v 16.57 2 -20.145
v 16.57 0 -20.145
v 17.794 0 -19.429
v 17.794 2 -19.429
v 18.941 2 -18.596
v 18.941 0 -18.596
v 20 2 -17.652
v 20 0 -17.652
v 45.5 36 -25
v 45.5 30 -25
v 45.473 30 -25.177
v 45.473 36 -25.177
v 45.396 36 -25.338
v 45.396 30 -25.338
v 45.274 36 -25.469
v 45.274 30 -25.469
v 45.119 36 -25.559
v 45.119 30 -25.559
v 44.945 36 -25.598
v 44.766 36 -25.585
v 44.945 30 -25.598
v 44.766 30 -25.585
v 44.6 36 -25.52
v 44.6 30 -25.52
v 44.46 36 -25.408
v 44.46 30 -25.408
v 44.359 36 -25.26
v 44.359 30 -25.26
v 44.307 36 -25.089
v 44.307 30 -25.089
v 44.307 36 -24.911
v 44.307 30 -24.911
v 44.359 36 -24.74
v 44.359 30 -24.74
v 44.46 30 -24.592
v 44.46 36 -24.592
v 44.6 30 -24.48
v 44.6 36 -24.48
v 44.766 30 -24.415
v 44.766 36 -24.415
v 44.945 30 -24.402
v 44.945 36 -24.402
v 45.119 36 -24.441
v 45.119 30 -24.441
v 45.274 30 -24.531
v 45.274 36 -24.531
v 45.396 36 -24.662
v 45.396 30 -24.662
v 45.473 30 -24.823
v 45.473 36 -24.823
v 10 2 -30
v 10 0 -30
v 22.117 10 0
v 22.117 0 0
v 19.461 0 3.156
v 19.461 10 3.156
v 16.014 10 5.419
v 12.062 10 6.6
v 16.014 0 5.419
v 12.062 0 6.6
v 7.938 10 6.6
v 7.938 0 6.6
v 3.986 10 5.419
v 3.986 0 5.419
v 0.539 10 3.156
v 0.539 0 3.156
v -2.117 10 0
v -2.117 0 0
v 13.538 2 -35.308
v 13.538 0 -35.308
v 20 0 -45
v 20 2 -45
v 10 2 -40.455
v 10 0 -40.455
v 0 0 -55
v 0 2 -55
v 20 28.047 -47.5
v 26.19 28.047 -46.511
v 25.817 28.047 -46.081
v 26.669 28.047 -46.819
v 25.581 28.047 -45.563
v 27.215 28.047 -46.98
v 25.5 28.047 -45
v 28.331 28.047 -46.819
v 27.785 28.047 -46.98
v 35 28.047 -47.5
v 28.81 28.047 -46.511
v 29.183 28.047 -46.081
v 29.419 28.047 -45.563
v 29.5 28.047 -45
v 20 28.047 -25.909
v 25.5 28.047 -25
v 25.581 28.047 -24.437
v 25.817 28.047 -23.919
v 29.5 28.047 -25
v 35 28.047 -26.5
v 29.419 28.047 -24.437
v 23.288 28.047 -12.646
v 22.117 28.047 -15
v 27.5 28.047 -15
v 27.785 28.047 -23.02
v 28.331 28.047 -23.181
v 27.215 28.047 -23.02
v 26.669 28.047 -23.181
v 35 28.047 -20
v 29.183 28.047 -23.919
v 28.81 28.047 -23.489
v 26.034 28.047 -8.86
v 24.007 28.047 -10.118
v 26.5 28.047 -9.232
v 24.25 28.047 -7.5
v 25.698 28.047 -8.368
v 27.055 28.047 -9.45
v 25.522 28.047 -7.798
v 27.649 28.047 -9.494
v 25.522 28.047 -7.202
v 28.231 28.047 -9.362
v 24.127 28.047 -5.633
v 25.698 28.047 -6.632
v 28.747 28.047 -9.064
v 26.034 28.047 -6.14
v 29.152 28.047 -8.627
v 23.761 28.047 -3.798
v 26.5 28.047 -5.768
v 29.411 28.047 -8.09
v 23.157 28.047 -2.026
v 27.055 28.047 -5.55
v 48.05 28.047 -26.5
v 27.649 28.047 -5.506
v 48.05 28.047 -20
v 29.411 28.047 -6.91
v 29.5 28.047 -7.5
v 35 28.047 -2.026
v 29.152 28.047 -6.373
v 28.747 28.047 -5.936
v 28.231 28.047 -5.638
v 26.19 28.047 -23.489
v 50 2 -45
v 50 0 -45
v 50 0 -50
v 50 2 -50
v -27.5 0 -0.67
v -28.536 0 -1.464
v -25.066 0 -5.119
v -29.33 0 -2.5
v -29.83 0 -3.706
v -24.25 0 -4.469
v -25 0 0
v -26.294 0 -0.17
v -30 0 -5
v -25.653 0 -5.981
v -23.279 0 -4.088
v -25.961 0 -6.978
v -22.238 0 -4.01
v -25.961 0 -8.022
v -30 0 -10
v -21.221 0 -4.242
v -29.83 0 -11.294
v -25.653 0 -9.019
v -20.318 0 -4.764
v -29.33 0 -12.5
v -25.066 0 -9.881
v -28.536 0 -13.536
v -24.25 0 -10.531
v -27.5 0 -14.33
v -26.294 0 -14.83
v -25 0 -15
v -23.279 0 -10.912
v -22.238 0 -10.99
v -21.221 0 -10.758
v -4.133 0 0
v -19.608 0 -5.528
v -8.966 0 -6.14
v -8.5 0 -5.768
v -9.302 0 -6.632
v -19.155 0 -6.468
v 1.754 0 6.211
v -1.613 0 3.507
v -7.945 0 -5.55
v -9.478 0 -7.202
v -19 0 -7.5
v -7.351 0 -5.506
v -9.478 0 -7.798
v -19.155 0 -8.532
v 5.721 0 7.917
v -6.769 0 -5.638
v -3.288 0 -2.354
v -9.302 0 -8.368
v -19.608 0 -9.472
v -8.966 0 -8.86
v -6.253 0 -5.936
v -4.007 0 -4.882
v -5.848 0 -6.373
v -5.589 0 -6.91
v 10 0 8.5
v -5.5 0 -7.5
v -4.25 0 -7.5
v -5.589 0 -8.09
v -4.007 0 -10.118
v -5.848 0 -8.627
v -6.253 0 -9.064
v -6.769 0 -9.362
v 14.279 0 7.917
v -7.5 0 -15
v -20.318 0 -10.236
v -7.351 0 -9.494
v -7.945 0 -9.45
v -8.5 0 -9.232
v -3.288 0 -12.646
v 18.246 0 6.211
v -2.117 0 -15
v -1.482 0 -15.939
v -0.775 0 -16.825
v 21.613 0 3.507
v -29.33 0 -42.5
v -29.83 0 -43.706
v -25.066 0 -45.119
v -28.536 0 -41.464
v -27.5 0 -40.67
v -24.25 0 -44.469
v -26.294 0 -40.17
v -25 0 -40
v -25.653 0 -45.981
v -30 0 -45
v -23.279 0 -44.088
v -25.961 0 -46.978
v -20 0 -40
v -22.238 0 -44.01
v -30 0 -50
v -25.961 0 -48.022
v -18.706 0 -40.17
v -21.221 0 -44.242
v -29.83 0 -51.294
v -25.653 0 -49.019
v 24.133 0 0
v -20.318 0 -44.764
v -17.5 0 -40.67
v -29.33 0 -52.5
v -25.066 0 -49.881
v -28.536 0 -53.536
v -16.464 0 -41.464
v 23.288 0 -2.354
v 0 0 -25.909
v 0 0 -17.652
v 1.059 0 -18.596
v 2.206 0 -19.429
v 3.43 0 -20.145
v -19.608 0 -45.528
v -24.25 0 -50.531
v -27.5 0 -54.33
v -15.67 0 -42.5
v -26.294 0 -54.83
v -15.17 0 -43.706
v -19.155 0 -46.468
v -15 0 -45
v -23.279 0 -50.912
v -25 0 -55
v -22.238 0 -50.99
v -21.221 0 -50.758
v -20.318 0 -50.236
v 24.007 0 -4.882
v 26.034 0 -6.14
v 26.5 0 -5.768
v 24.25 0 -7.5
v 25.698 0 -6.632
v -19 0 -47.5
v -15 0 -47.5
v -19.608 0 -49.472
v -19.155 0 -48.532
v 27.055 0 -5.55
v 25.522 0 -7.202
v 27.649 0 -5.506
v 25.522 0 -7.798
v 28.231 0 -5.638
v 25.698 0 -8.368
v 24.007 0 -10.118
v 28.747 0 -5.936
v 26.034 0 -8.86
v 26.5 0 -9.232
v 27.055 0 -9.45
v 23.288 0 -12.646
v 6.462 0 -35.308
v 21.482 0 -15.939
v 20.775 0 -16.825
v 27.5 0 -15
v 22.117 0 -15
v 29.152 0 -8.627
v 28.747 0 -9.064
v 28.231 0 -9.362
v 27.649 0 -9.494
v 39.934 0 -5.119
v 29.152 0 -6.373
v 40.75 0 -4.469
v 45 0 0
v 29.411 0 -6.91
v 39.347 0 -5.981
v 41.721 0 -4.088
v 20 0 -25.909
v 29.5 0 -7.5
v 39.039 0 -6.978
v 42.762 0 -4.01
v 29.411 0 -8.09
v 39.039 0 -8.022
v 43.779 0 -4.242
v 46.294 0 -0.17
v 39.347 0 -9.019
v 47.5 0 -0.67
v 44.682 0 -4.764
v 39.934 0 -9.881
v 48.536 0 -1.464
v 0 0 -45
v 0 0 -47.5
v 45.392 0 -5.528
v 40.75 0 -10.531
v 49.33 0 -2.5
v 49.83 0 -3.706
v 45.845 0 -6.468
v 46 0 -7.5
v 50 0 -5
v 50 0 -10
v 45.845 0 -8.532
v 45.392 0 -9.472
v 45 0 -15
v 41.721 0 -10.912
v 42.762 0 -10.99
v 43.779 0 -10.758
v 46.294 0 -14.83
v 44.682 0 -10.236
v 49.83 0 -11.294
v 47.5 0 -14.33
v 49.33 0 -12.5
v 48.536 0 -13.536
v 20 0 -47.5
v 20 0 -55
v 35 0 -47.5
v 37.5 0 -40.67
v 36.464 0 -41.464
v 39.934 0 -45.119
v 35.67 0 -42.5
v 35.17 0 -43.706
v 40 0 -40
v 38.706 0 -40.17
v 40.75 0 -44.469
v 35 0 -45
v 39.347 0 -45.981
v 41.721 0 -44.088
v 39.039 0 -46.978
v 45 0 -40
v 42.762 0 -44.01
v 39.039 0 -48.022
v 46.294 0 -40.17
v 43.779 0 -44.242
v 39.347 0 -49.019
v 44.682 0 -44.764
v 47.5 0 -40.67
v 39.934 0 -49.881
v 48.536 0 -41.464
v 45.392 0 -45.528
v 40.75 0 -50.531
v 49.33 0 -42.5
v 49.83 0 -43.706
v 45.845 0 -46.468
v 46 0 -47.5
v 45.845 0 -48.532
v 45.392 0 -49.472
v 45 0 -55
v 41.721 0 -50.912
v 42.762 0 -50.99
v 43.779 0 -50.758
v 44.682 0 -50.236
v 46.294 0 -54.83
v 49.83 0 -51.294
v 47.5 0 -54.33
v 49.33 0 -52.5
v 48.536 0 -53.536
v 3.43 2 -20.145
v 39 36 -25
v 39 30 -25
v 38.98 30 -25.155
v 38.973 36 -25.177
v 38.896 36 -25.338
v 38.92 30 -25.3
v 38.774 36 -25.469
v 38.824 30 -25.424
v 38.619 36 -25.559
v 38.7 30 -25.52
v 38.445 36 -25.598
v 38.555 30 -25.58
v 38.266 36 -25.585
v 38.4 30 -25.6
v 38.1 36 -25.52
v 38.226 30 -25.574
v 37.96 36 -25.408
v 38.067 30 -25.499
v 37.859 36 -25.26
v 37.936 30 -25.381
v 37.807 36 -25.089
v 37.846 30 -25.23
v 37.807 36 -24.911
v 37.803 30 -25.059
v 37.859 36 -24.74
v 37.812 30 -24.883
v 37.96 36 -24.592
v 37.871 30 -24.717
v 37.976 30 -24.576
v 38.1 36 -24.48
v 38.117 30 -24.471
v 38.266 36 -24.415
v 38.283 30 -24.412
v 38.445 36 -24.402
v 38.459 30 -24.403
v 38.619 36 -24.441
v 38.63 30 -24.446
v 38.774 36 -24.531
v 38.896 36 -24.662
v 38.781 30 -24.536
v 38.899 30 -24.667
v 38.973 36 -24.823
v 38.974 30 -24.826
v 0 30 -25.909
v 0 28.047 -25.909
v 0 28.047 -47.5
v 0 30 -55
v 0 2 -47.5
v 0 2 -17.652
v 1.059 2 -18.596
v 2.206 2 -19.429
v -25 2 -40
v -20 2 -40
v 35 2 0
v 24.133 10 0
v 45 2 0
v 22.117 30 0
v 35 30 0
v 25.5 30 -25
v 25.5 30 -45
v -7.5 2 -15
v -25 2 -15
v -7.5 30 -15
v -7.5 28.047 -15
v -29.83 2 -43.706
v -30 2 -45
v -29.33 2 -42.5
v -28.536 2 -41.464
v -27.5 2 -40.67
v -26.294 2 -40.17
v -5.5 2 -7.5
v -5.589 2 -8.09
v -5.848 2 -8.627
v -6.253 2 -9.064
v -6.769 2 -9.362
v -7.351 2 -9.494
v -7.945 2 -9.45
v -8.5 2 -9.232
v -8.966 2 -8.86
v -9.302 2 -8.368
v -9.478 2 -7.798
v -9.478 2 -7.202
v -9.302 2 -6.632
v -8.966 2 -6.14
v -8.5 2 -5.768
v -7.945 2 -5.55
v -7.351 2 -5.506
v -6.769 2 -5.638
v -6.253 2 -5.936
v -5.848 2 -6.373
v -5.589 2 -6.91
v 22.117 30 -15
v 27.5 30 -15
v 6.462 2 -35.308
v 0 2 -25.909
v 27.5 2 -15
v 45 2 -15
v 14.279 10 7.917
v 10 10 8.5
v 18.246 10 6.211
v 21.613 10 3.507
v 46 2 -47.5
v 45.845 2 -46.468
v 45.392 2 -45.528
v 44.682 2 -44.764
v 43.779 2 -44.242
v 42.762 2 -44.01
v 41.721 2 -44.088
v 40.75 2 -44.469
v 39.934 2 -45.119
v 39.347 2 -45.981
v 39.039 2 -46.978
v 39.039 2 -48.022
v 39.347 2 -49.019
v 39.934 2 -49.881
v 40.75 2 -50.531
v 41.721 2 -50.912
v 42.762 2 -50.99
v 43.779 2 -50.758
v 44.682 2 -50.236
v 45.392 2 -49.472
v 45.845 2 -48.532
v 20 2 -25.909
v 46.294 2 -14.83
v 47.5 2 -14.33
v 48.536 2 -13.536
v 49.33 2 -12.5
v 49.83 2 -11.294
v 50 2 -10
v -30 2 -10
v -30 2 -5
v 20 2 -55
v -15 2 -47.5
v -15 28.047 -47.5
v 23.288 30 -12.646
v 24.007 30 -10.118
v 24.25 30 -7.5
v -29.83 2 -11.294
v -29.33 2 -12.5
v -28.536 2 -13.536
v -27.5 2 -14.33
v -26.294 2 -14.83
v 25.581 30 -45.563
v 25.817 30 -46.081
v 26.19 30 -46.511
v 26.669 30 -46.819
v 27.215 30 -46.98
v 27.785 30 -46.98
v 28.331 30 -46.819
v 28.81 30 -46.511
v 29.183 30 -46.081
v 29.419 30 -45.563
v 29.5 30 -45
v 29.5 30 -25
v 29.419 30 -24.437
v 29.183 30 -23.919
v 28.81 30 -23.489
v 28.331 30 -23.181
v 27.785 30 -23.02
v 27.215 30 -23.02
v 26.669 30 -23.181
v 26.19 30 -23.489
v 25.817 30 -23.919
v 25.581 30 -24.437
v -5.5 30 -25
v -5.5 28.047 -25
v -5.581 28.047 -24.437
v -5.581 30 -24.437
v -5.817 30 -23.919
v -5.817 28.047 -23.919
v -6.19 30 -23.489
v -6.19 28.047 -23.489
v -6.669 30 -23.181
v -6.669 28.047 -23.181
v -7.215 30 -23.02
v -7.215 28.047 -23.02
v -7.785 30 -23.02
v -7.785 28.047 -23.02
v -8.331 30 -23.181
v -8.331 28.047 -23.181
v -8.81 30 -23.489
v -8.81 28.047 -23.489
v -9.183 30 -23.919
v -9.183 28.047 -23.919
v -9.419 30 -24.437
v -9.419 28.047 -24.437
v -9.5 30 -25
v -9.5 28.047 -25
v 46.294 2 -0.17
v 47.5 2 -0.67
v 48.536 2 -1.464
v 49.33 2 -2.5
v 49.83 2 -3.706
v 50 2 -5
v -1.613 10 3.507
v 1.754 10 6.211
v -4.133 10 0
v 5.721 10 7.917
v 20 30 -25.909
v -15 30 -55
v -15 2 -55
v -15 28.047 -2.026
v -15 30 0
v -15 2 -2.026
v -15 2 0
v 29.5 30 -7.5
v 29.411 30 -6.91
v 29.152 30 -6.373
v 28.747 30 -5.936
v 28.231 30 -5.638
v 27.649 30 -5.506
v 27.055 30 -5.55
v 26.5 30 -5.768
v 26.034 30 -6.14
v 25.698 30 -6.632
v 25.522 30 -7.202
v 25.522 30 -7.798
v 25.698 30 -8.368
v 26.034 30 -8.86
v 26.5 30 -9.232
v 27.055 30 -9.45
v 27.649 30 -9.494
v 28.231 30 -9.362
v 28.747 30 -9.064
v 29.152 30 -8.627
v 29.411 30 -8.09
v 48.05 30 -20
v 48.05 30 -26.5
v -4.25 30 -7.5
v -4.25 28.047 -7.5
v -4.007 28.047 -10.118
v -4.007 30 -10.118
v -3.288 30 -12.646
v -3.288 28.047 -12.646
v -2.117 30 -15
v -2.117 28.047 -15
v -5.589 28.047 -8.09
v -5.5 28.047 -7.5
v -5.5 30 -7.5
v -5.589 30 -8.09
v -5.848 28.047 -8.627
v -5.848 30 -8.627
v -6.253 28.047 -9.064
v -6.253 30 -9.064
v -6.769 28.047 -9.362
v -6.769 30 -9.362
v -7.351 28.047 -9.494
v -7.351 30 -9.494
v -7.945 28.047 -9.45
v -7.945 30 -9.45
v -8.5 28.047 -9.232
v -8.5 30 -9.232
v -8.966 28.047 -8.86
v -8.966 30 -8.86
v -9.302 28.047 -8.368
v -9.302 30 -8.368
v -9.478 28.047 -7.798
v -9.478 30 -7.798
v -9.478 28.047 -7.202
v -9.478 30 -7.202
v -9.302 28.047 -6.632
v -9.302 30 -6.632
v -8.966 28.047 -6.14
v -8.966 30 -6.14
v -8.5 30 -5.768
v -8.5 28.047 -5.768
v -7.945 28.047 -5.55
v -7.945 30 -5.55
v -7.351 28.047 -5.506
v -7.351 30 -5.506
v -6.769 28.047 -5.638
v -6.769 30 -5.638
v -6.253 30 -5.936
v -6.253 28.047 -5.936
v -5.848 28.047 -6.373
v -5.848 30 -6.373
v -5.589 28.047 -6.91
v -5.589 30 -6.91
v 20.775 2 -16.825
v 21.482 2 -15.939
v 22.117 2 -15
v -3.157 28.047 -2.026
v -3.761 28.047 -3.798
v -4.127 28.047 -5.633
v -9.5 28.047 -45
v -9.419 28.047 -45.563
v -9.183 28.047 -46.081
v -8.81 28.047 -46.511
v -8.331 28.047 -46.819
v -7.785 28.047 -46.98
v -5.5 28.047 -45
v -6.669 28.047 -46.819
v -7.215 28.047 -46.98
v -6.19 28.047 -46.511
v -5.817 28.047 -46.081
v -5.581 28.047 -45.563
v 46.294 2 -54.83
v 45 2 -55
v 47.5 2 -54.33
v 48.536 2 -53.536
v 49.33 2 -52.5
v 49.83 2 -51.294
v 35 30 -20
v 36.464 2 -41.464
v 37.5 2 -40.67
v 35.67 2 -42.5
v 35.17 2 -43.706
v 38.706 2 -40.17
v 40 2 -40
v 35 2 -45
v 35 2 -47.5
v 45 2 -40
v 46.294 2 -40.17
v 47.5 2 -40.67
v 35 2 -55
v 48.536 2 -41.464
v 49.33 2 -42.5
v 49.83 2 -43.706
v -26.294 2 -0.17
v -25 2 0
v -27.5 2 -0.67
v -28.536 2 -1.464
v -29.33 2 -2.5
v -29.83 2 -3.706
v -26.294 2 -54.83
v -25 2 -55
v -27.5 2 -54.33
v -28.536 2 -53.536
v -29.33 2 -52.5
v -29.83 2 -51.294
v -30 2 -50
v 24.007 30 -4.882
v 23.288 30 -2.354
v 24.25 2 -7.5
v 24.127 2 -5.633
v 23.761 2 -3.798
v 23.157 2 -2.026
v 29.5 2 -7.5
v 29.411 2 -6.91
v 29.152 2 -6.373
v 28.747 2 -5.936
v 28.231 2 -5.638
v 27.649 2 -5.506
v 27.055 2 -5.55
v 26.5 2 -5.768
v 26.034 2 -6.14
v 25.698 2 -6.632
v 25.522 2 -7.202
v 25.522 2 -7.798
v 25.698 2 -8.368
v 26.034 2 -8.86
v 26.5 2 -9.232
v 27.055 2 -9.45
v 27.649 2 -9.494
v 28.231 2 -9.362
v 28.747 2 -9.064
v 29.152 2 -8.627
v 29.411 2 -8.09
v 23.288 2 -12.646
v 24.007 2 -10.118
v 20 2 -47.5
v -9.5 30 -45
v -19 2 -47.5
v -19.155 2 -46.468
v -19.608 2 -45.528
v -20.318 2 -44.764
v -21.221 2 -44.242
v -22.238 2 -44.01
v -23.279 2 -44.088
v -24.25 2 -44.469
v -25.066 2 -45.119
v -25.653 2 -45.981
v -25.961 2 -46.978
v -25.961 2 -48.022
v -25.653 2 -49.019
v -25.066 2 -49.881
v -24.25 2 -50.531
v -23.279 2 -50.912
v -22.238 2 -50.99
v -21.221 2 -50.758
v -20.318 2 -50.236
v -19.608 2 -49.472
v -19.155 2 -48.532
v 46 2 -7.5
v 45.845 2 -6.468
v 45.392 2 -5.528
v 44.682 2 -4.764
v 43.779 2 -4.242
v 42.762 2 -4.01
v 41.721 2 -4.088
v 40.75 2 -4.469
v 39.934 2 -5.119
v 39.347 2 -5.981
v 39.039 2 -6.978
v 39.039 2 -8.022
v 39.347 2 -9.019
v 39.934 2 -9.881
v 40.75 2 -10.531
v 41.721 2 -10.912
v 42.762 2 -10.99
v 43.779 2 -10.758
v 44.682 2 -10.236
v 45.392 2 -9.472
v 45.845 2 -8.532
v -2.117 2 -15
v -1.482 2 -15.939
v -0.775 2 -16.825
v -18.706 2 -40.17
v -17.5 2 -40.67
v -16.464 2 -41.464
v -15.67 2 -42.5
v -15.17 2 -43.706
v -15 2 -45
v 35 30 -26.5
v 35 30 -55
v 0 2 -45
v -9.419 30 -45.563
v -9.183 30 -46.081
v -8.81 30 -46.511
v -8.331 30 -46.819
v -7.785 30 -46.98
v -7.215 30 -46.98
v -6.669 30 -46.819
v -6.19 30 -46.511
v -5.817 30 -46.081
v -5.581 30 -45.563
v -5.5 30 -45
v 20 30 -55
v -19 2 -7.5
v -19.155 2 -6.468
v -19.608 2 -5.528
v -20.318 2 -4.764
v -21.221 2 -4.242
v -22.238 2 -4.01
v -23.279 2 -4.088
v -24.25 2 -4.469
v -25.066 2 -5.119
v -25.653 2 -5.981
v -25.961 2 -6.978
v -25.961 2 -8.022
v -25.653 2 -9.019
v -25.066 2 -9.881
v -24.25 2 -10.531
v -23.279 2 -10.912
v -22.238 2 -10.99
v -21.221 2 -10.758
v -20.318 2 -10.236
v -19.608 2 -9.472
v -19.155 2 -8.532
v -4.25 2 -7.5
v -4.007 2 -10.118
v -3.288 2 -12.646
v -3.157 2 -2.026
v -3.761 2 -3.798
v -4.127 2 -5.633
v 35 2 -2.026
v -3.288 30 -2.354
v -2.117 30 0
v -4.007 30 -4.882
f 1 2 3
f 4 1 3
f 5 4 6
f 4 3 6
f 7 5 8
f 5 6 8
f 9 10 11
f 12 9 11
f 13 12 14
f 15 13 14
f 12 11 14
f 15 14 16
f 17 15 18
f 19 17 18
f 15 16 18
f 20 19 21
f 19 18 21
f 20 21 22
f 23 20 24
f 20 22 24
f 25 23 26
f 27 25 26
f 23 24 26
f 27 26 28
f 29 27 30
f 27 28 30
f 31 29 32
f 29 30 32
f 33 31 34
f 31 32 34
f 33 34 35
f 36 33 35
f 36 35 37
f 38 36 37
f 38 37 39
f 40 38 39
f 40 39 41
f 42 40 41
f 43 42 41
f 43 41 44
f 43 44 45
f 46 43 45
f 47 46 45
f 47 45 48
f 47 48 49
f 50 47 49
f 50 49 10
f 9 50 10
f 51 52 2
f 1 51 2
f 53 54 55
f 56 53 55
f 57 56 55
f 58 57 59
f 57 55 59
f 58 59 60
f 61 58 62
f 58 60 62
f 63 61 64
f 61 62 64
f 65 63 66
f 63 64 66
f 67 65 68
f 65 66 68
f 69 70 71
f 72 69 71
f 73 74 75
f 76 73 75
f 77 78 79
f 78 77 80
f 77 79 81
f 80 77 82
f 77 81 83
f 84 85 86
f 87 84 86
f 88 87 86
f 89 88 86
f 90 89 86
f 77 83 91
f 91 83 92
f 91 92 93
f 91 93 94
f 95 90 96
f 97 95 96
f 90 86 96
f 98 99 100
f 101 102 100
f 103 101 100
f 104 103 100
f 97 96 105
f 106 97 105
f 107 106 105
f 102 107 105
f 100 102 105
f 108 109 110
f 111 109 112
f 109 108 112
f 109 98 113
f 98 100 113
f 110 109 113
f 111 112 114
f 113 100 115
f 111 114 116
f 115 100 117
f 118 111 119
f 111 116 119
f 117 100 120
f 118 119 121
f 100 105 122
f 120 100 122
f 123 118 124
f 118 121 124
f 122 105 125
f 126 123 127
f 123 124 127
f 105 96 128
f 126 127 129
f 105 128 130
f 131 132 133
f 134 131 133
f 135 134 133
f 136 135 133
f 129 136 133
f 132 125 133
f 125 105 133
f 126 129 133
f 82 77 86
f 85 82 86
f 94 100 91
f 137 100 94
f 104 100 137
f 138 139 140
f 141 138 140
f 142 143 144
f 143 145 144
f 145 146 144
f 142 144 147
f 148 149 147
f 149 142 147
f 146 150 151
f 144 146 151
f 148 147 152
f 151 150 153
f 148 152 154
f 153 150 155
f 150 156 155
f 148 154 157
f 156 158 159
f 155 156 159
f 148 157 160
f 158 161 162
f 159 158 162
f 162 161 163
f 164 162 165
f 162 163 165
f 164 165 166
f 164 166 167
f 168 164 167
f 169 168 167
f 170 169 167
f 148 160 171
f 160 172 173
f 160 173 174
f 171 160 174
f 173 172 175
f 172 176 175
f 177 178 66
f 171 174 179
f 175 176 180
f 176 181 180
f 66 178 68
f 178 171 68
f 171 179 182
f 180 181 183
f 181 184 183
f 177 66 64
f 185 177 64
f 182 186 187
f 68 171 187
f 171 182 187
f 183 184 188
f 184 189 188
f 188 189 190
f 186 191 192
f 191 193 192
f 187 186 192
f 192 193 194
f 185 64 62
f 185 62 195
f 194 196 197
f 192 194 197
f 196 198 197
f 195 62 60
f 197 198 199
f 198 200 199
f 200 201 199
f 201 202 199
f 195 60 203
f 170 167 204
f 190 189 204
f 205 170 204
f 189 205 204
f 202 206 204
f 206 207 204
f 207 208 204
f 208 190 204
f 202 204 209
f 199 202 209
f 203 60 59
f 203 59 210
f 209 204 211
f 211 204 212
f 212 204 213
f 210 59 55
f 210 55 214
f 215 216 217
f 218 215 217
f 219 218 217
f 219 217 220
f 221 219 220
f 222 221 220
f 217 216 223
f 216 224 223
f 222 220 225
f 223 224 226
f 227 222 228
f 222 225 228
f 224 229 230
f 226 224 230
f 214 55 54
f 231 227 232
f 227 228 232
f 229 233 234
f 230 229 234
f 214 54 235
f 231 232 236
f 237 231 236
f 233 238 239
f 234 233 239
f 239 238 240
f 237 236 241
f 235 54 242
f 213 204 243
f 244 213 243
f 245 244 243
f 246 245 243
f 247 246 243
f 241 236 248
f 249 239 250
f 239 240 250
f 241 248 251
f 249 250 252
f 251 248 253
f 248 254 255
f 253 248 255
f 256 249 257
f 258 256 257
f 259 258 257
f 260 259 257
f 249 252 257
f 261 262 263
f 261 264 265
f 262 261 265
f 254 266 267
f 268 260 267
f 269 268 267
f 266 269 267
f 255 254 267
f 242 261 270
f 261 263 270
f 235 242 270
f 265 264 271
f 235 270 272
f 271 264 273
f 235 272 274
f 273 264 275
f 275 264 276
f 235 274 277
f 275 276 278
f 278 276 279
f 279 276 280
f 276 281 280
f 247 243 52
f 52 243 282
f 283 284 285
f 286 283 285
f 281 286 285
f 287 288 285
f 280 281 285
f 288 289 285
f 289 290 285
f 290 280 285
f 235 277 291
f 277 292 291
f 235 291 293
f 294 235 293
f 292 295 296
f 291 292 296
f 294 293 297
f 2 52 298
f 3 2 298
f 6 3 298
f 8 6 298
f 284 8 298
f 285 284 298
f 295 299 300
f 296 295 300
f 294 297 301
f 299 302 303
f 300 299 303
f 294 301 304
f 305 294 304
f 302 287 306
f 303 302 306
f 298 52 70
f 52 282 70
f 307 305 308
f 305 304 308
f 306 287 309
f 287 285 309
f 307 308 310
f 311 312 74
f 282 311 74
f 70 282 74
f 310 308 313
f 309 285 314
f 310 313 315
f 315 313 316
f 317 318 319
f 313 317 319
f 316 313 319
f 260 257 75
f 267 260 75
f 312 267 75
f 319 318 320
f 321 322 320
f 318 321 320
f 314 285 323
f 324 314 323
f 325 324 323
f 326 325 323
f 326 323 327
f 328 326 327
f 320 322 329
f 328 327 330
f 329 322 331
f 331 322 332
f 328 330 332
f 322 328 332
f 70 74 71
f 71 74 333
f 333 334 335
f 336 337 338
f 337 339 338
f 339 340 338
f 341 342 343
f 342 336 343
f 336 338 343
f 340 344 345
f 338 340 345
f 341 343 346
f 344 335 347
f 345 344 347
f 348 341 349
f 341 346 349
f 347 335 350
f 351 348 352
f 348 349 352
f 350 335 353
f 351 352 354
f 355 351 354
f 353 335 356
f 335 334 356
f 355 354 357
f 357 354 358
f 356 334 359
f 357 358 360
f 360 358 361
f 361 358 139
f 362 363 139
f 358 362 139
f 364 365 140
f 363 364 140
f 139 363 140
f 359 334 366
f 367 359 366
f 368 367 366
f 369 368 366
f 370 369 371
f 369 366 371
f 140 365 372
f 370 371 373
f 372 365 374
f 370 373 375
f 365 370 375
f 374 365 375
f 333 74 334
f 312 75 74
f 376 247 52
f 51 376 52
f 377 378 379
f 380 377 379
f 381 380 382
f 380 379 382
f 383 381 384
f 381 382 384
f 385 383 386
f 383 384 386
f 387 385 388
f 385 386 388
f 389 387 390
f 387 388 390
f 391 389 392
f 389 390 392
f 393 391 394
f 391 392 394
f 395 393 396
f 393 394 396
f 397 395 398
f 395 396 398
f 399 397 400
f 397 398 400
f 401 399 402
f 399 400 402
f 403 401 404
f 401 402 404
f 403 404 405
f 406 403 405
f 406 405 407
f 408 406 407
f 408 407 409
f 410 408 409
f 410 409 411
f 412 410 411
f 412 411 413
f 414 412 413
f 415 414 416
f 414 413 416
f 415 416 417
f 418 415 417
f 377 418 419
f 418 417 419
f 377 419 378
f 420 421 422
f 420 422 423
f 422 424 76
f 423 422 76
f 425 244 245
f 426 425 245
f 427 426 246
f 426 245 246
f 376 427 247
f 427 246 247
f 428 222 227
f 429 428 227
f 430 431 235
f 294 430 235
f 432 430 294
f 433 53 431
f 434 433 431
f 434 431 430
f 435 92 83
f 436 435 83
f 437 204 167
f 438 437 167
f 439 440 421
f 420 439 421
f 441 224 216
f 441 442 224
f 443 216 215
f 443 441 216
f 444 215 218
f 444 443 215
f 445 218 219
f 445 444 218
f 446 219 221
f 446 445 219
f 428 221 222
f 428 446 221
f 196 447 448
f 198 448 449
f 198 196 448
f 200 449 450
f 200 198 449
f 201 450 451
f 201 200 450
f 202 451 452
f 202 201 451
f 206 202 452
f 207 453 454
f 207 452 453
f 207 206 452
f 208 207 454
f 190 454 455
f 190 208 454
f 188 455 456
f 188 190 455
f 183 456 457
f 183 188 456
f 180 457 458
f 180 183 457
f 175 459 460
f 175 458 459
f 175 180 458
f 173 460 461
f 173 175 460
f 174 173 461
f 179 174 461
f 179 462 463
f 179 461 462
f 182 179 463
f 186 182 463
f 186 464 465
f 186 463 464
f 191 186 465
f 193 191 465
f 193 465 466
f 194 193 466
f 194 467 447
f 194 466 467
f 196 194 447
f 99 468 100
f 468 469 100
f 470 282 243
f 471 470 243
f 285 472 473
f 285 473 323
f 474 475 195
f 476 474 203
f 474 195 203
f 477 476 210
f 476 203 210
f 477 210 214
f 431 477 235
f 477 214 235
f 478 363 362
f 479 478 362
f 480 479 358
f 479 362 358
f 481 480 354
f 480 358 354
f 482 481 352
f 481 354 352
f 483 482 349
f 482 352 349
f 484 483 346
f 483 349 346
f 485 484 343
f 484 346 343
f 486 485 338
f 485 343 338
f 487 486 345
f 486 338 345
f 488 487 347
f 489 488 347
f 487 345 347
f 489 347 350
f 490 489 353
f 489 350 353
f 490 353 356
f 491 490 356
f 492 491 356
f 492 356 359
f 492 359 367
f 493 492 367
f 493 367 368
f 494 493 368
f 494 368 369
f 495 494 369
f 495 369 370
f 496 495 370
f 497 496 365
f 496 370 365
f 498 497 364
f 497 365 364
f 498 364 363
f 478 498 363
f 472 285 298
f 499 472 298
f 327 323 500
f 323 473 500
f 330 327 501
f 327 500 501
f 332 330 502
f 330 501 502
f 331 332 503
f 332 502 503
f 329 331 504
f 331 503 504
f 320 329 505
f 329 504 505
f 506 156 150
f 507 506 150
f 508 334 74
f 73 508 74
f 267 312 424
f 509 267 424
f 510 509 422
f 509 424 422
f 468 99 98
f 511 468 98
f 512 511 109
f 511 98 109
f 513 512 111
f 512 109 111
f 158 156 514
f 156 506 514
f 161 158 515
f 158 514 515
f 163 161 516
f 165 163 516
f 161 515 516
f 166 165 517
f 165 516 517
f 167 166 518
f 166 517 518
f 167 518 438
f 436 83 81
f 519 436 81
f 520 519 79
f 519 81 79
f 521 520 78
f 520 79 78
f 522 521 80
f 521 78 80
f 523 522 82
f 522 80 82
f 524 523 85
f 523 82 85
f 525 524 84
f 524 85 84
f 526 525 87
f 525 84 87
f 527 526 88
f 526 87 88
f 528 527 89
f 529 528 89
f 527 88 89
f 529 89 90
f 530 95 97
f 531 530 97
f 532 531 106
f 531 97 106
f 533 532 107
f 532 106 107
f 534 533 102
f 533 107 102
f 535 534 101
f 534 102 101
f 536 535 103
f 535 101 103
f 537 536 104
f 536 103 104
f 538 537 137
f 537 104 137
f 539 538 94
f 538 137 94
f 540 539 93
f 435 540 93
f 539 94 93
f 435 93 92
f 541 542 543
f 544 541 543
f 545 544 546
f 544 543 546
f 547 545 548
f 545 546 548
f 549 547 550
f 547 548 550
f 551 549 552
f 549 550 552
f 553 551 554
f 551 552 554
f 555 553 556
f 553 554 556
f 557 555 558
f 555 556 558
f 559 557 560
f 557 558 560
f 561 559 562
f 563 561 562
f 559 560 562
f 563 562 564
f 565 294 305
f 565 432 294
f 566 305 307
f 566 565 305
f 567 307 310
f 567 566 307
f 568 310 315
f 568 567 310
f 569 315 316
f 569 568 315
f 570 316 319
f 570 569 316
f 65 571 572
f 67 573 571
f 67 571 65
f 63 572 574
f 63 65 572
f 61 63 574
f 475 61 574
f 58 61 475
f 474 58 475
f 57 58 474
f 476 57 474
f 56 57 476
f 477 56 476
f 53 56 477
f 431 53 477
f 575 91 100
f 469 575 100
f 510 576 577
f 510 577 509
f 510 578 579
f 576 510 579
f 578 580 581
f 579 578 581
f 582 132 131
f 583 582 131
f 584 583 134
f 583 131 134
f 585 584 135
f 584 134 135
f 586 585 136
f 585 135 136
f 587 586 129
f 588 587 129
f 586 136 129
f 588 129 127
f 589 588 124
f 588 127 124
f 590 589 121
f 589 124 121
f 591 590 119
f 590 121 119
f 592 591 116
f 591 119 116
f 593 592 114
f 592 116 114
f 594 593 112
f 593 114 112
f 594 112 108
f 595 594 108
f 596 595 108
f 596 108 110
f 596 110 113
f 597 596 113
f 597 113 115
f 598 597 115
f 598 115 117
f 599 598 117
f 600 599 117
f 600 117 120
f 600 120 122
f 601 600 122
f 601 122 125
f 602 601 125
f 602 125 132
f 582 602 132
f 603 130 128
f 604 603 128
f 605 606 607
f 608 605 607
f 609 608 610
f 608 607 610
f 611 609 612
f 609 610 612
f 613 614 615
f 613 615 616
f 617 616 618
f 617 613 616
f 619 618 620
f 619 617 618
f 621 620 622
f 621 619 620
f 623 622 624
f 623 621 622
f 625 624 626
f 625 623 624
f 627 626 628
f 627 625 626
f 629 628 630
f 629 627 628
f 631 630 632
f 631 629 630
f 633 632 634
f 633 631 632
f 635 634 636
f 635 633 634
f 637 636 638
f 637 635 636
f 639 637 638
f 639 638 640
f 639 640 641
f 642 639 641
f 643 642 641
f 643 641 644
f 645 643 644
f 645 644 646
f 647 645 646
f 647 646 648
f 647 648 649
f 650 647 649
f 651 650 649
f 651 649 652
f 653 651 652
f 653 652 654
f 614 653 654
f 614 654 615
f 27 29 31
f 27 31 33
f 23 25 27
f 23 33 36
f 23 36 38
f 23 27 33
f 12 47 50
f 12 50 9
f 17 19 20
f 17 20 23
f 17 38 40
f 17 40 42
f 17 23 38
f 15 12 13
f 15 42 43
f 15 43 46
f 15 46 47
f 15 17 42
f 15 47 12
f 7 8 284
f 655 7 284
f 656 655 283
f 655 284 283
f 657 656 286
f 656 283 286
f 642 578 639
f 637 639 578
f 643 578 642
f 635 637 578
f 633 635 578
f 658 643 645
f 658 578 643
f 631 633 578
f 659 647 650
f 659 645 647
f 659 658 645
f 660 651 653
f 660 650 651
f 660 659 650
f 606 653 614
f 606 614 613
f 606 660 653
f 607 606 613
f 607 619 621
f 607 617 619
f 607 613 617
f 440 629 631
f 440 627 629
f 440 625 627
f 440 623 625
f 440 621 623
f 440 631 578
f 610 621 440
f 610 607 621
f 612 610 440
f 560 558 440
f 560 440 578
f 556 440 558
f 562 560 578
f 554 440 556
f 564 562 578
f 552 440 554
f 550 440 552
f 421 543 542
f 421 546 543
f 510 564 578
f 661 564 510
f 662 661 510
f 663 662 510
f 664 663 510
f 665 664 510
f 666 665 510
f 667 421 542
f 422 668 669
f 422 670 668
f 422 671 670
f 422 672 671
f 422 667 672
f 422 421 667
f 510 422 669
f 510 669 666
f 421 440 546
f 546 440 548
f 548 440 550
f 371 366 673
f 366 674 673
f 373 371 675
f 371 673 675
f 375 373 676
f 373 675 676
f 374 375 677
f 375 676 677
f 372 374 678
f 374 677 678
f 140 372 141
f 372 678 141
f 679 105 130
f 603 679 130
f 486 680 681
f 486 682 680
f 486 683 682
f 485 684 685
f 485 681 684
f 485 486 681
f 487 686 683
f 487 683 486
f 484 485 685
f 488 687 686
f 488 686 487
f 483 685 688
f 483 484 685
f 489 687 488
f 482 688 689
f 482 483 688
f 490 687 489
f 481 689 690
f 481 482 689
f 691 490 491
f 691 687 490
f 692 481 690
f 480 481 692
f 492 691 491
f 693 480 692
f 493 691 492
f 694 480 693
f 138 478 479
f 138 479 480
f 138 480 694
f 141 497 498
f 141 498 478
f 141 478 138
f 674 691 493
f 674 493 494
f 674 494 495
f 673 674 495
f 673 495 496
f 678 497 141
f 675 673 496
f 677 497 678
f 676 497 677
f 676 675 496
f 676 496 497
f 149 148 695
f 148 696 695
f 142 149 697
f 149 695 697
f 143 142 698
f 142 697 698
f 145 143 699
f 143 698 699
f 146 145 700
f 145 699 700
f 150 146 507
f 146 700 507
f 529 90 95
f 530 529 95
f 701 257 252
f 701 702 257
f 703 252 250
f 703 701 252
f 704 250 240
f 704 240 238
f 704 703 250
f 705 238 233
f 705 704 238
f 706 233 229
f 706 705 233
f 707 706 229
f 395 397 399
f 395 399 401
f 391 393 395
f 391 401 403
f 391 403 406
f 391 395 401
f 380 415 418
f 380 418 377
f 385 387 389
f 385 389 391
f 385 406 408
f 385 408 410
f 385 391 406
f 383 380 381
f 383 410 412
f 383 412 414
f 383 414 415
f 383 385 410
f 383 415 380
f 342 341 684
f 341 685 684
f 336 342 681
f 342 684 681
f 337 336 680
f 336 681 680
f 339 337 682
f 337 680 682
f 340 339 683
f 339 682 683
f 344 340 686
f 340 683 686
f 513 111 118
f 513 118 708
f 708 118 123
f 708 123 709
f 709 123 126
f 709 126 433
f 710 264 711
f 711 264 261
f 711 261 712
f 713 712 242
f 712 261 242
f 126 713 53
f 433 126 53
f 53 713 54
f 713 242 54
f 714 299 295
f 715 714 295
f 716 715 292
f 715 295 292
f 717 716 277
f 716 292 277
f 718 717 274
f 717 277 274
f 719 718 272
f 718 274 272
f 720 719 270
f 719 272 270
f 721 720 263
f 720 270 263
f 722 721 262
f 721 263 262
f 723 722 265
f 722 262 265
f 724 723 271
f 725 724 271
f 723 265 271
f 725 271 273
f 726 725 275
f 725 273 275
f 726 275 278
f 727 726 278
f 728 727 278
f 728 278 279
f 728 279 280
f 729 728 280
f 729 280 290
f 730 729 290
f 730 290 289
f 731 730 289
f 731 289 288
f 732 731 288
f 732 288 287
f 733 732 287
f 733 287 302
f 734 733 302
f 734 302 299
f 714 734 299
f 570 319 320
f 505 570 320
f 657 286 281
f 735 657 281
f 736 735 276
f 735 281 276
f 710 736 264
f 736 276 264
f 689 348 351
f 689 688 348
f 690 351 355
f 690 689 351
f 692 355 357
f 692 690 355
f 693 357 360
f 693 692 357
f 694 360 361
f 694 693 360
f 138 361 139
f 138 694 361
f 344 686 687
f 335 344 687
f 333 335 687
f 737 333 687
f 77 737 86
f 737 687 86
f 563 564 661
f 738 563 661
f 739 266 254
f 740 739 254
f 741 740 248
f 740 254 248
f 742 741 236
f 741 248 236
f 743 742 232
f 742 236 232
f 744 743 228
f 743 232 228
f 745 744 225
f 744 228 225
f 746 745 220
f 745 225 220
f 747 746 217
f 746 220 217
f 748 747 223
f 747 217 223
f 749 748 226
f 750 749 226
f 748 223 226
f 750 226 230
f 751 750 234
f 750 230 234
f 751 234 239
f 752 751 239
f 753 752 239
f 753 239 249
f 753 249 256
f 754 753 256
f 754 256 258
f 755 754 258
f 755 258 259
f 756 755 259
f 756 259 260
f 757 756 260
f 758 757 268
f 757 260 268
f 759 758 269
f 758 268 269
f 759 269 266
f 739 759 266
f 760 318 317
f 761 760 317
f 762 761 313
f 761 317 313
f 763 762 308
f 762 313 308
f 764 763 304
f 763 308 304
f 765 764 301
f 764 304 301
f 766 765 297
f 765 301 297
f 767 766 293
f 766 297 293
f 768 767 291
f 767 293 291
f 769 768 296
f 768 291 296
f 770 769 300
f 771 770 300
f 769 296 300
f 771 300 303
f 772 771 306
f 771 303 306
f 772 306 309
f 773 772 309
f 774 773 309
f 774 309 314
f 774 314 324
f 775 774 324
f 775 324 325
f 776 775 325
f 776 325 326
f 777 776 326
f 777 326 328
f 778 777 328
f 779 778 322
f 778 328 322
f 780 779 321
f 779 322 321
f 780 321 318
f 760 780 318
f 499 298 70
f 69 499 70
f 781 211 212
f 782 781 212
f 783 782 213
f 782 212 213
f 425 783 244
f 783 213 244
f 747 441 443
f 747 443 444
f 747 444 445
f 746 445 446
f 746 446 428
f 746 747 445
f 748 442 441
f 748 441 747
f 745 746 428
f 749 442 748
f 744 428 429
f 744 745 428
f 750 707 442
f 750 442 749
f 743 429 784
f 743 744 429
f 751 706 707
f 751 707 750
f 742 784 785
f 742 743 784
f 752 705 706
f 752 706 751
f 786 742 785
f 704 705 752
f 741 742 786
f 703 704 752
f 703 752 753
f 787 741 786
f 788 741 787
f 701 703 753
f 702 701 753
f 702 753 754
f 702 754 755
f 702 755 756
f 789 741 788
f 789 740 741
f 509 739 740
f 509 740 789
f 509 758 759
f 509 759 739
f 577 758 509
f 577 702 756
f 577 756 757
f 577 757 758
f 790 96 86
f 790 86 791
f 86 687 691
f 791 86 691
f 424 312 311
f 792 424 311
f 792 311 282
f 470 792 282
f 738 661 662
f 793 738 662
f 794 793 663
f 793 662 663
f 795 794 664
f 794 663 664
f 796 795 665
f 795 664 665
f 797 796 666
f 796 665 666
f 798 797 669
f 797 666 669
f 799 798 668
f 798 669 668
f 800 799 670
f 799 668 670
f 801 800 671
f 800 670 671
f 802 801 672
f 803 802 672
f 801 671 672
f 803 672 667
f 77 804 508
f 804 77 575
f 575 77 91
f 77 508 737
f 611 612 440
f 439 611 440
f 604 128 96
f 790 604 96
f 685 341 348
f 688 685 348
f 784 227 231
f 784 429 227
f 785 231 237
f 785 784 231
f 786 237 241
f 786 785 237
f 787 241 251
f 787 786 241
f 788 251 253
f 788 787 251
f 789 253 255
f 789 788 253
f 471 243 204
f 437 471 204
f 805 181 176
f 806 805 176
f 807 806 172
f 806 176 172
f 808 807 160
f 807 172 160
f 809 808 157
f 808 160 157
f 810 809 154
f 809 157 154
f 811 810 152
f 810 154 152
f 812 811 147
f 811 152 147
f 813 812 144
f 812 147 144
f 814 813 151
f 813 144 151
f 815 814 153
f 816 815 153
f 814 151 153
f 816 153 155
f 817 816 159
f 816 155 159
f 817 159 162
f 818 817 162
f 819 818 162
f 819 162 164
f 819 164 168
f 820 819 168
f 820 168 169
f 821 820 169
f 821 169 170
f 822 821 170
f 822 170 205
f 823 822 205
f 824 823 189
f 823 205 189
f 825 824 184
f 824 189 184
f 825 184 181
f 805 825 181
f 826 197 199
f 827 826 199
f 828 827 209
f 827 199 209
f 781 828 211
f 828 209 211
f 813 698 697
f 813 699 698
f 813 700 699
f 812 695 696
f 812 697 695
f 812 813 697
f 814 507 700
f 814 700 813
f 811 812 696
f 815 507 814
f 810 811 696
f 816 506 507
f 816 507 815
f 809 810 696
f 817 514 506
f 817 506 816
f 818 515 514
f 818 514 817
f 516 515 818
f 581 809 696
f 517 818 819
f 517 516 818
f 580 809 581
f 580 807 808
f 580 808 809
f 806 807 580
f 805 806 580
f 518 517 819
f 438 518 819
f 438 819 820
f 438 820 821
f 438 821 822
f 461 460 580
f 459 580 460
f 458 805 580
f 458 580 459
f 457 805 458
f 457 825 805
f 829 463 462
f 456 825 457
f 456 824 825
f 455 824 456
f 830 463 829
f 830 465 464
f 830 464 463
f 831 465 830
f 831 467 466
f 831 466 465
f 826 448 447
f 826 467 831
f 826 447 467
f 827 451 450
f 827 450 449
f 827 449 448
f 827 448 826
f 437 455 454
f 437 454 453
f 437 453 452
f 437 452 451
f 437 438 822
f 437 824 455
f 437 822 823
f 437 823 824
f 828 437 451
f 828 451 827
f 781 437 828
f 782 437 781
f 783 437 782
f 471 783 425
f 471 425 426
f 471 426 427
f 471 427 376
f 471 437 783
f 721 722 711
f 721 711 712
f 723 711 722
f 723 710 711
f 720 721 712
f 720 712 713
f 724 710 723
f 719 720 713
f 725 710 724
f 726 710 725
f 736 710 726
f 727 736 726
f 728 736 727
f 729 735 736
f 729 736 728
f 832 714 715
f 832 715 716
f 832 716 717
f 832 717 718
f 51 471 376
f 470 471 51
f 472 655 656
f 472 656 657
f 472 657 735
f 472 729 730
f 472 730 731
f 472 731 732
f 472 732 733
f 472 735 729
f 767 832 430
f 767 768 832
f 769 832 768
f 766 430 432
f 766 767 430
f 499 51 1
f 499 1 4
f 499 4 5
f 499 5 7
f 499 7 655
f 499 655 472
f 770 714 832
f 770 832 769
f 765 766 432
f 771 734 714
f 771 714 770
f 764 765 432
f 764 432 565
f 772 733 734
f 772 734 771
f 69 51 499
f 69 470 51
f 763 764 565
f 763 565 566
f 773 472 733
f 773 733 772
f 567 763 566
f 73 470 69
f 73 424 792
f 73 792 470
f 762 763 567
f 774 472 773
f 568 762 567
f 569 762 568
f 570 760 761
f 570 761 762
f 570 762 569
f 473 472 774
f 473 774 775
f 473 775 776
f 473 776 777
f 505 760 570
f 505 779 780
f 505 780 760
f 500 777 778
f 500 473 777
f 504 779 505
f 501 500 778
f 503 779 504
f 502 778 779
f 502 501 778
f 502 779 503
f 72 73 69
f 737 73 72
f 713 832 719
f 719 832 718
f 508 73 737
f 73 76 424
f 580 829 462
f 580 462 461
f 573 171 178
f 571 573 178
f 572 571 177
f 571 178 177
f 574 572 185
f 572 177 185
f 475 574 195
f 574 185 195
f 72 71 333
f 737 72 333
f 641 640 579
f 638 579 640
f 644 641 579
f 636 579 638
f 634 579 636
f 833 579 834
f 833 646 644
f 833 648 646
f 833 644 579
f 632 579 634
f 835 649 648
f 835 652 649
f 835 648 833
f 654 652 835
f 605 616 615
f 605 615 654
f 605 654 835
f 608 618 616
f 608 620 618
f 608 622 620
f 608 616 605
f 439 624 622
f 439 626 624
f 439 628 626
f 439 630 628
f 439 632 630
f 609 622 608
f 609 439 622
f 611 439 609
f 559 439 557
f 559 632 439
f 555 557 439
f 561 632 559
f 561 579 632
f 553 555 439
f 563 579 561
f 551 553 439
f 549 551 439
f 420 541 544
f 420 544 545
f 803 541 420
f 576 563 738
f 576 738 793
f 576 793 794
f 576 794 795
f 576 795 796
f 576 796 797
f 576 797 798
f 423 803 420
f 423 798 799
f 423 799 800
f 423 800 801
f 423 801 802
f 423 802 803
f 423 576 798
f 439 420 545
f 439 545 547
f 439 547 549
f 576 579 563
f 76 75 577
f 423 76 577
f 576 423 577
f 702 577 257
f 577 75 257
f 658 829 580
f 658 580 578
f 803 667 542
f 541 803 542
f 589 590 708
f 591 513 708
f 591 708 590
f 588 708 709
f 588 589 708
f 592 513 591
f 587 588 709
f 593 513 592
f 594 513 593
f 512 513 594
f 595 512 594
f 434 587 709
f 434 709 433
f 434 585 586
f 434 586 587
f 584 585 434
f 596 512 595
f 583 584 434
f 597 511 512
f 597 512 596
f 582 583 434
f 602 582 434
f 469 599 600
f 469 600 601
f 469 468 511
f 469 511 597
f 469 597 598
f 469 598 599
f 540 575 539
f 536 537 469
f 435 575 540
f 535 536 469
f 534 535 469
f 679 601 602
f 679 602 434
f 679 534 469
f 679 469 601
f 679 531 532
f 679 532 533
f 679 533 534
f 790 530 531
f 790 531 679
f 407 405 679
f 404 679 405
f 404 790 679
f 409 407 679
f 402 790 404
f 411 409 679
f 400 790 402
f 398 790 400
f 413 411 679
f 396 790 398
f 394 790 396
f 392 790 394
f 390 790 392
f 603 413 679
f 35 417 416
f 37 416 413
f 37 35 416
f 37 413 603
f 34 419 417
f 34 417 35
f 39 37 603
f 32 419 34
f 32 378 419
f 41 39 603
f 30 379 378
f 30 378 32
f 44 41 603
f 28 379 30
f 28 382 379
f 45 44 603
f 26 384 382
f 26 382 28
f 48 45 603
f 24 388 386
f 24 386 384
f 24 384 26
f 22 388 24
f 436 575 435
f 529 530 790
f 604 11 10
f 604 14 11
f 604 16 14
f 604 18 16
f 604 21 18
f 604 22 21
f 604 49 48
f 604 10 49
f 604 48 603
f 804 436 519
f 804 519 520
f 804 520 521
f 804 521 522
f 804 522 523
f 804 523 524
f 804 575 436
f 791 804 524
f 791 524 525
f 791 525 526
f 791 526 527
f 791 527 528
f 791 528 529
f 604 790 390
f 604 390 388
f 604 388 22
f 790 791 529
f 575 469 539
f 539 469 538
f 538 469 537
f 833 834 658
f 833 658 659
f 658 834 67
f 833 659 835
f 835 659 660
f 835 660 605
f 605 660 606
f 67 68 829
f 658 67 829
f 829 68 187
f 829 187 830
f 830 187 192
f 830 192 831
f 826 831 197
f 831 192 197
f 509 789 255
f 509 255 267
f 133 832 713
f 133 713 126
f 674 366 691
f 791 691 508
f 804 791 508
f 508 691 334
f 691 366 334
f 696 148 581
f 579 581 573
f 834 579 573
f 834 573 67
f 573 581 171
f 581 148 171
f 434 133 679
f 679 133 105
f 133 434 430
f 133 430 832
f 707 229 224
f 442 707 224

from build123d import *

# Parameters (mm, degrees)
SKETCH1_R             = 2
BOSS_EXTRUDE3_DEPTH   = 30
BOSS_EXTRUDE3_2_DEPTH = 30
SKETCH1_6_W           = 15
SKETCH1_6_H           = 15
SKETCH1_6_R           = 3.5
BOSS_EXTRUDE5_DEPTH   = 2
BOSS_EXTRUDE7_DEPTH   = 30
BOSS_EXTRUDE8_DEPTH   = 30
SKETCH6_W             = 28.26658805
SKETCH6_H             = 20
CUT_EXTRUDE2_DEPTH    = 9
SKETCH1_11_R          = 0.6
BOSS_EXTRUDE9_DEPTH   = 36
BOSS_EXTRUDE9_2_DEPTH = 36
SKETCH1_12_R          = 0.6
BOSS_EXTRUDE10_DEPTH  = 30
SKETCH8_W             = 13.05
SKETCH8_H             = 28.046654986
CUT_EXTRUDE3_DEPTH    = 7
CUT_EXTRUDE8_DEPTH    = 50
FILLET2_R             = 5
SKETCH11_W            = 12.973509336
SKETCH11_H            = 26.046654986
CUT_EXTRUDE9_DEPTH    = 52
BOSS_EXTRUDE11_DEPTH  = 2


with BuildPart() as part:
    # Sketch1 → Boss-Extrude3 (new body)
    with BuildSketch(Plane(origin=(0, 0, 0), x_dir=(1, 0, 0), z_dir=(0, 1, 0))):
        with BuildLine():
            Line((-15, 0), (-2.116620816, 0))
            ThreePointArc((-2.116620816, 0), (-3.706282257, 3.601240366), (-4.25, 7.5))
            ThreePointArc((-4.25, 7.5), (-3.706282257, 11.398759634), (-2.116620816, 15))
            Line((-2.116620816, 15), (-7.5, 15))
            Line((-7.5, 15), (0, 25.909090909))
            Line((0, 25.909090909), (0, 55))
            Line((0, 55), (-15, 55))
            Line((-15, 55), (-15, 0))
        make_face()
        with Locations((-7.5, 7.5)):
            Circle(SKETCH1_R, mode=Mode.SUBTRACT)
        with BuildLine():
            ThreePointArc((-9.5, 45), (-7.5, 47), (-5.5, 45))
            Line((-5.5, 45), (-5.5, 25))
            ThreePointArc((-5.5, 25), (-7.5, 23), (-9.5, 25))
            Line((-9.5, 25), (-9.5, 45))
        make_face(mode=Mode.SUBTRACT)
    extrude(amount=BOSS_EXTRUDE3_DEPTH)



with BuildPart() as body_2:
    # Sketch1 → Boss-Extrude3 2 (new body)
    with BuildSketch(Plane(origin=(0, 0, 0), x_dir=(1, 0, 0), z_dir=(0, 1, 0))):
        with BuildLine():
            ThreePointArc((22.116620816, 15), (23.706282257, 11.398759634), (24.25, 7.5))
            Line((24.25, 7.5), (25.5, 7.5))
            ThreePointArc((25.5, 7.5), (27.5, 9.5), (29.5, 7.5))
            Line((29.5, 7.5), (35, 7.5))
            Line((35, 7.5), (35, 55))
            Line((35, 55), (20, 55))
            Line((20, 55), (20, 25.909090909))
            Line((20, 25.909090909), (27.5, 15))
            Line((27.5, 15), (22.116620816, 15))
        make_face()
        with BuildLine():
            ThreePointArc((29.5, 25), (27.5, 23), (25.5, 25))
            Line((25.5, 25), (25.5, 45))
            ThreePointArc((25.5, 45), (27.5, 47), (29.5, 45))
            Line((29.5, 45), (29.5, 25))
        make_face(mode=Mode.SUBTRACT)
    extrude(amount=BOSS_EXTRUDE3_2_DEPTH)


with BuildPart() as part_1:
    add(part.part)

    add(body_2.part)  # Boss-Extrude5 merges body 2
    # Sketch1<6> → Boss-Extrude5 (add)
    # profile 1 of 4: a face of its own
    with BuildSketch(Plane(origin=(0, 0, 0), x_dir=(1, 0, 0), z_dir=(0, 1, 0))):
        with Locations((-22.5, 7.5)):
            Rectangle(SKETCH1_6_W, SKETCH1_6_H)
        with Locations((-22.5, 7.5)):
            Circle(SKETCH1_6_R, mode=Mode.SUBTRACT)
    # profile 2 of 4: a face of its own
    with BuildSketch(Plane(origin=(0, 0, 0), x_dir=(1, 0, 0), z_dir=(0, 1, 0))):
        with Locations((42.5, 7.5)):
            Rectangle(SKETCH1_6_W, SKETCH1_6_H)
        with Locations((42.5, 7.5)):
            Circle(SKETCH1_6_R, mode=Mode.SUBTRACT)
    # profile 3 of 4: a face of its own
    with BuildSketch(Plane(origin=(0, 0, 0), x_dir=(1, 0, 0), z_dir=(0, 1, 0))):
        with Locations((-22.5, 47.5)):
            Rectangle(SKETCH1_6_W, SKETCH1_6_H)
        with Locations((-22.5, 47.5)):
            Circle(SKETCH1_6_R, mode=Mode.SUBTRACT)
    # profile 4 of 4: a face of its own
    with BuildSketch(Plane(origin=(0, 0, 0), x_dir=(1, 0, 0), z_dir=(0, 1, 0))):
        with Locations((42.5, 47.5)):
            Rectangle(SKETCH1_6_W, SKETCH1_6_H)
        with Locations((42.5, 47.5)):
            Circle(SKETCH1_6_R, mode=Mode.SUBTRACT)
    extrude(amount=BOSS_EXTRUDE5_DEPTH)

    # Sketch1<8> → Boss-Extrude7 (add)
    with BuildSketch(Plane(origin=(0, 0, 0), x_dir=(1, 0, 0), z_dir=(0, 1, 0))):
        with BuildLine():
            Line((-2.116620816, 0), (-4.133294025, 0))
            ThreePointArc((-4.133294025, 0), (1.753788749, -6.211309201), (10, -8.5))
            ThreePointArc((10, -8.5), (18.246211251, -6.211309201), (24.133294025, 0))
            Line((24.133294025, 0), (22.116620816, 0))
            ThreePointArc((22.116620816, 0), (10, -6.75), (-2.116620816, 0))
        make_face()
    extrude(amount=BOSS_EXTRUDE7_DEPTH)

    # Sketch1<9> → Boss-Extrude8 (add)
    with BuildSketch(Plane(origin=(0, 0, 0), x_dir=(1, 0, 0), z_dir=(0, 1, 0))):
        with BuildLine():
            ThreePointArc((24.25, 7.5), (23.706282257, 3.601240366), (22.116620816, 0))
            Line((22.116620816, 0), (24.133294025, 0))
            Line((24.133294025, 0), (35, 0))
            Line((35, 0), (35, 7.5))
            Line((35, 7.5), (29.5, 7.5))
            ThreePointArc((29.5, 7.5), (27.5, 5.5), (25.5, 7.5))
            Line((25.5, 7.5), (24.25, 7.5))
        make_face()
    extrude(amount=BOSS_EXTRUDE8_DEPTH)

    # Sketch6 → Cut-Extrude2 (cut)
    with BuildSketch(Plane.XY):
        with Locations((10, 20)):
            Rectangle(SKETCH6_W, SKETCH6_H)
    extrude(amount=CUT_EXTRUDE2_DEPTH, mode=Mode.SUBTRACT)



with BuildPart() as body_2_2:
    # Sketch1<11> → Boss-Extrude9 (new body)
    with BuildSketch(Plane(origin=(0, 0, 0), x_dir=(1, 0, 0), z_dir=(0, 1, 0))):
        with Locations((44.9, 25)):
            Circle(SKETCH1_11_R)
    extrude(amount=BOSS_EXTRUDE9_DEPTH)


with BuildPart() as body_3:
    # Sketch1<11> → Boss-Extrude9 2 (new body)
    with BuildSketch(Plane(origin=(0, 0, 0), x_dir=(1, 0, 0), z_dir=(0, 1, 0))):
        with Locations((38.4, 25)):
            Circle(SKETCH1_11_R)
    extrude(amount=BOSS_EXTRUDE9_2_DEPTH)


with BuildPart() as part_2:
    add(part_1.part)

    add(body_2_2.part)  # Boss-Extrude10 merges body 2 2

    add(body_3.part)  # Boss-Extrude10 merges body 3
    # Sketch1<12> → Boss-Extrude10 (add)
    with BuildSketch(Plane(origin=(0, 0, 0), x_dir=(1, 0, 0), z_dir=(0, 1, 0))):
        Polygon((35, 26.5), (35, 20), (48.05, 20), (48.05, 26.5), (38.4, 26.5), align=None)
        with BuildLine():
            ThreePointArc((39, 25), (37.975735931, 24.575735931), (38.4, 25.6))
            ThreePointArc((38.4, 25.6), (38.824264069, 25.424264069), (39, 25))
        make_face(mode=Mode.SUBTRACT)
        with Locations((44.9, 25)):
            Circle(SKETCH1_12_R, mode=Mode.SUBTRACT)
    extrude(amount=BOSS_EXTRUDE10_DEPTH)

    # Sketch8 → Cut-Extrude3 (cut)
    with BuildSketch(Plane.XY.offset(-20)):
        with Locations((41.525, 14.023327493)):
            Rectangle(SKETCH8_W, SKETCH8_H)
    extrude(amount=-CUT_EXTRUDE3_DEPTH, mode=Mode.SUBTRACT)

    # Sketch10 → Cut-Extrude8 (cut)
    with BuildSketch(Plane(origin=(35, 0, 0), x_dir=(0, 0, -1), z_dir=(1, 0, 0))):
        Polygon((15, 2), (15, 0), (40, 0), (47.5, 0), (47.5, 28.046654986), (15, 28.046654986), align=None)
    extrude(amount=-CUT_EXTRUDE8_DEPTH, mode=Mode.SUBTRACT)

    # Fillet2
    fillet2_edges = [part_2.edges().sort_by_distance(p)[0] for p in [
        (-30, 1, -15),
        (-30, 1, -40),
        (-30, 1, -55),
        (-15, 1, -40),
        (-30, 1, 0),
        (50, 1, 0),
        (50, 1, -15),
        (35, 1, -40),
        (50, 1, -40),
        (50, 1, -55),
    ]]
    fillet(fillet2_edges, radius=FILLET2_R)

    # Sketch11 → Cut-Extrude9 (cut)
    with BuildSketch(Plane(origin=(35, 0, 0), x_dir=(0, 0, -1), z_dir=(1, 0, 0))):
        with Locations((8.513245332, 15.023327493)):
            Rectangle(SKETCH11_W, SKETCH11_H)
    extrude(amount=-CUT_EXTRUDE9_DEPTH, mode=Mode.SUBTRACT)

    # Sketch1<13> → Boss-Extrude11 (add)
    with BuildSketch(Plane(origin=(0, 0, 0), x_dir=(1, 0, 0), z_dir=(0, 1, 0))):
        with BuildLine():
            Line((-7.5, 15), (-2.116620816, 15))
            ThreePointArc((-2.116620816, 15), (0.309032182, 17.947374921), (3.43006352, 20.145095281))
            Line((3.43006352, 20.145095281), (10, 30))
            Line((10, 30), (16.56993648, 20.145095281))
            ThreePointArc((16.56993648, 20.145095281), (19.690967818, 17.947374921), (22.116620816, 15))
            Line((22.116620816, 15), (27.5, 15))
            Line((27.5, 15), (13.538461538, 35.307692308))
            Line((13.538461538, 35.307692308), (20, 45))
            Line((20, 45), (20, 55))
            Line((20, 55), (10, 40.454545455))
            Line((10, 40.454545455), (0, 55))
            Line((0, 55), (0, 45))
            Line((0, 45), (6.461538462, 35.307692308))
            Line((6.461538462, 35.307692308), (-7.5, 15))
        make_face()
    extrude(amount=BOSS_EXTRUDE11_DEPTH)


solid = part_2.part
